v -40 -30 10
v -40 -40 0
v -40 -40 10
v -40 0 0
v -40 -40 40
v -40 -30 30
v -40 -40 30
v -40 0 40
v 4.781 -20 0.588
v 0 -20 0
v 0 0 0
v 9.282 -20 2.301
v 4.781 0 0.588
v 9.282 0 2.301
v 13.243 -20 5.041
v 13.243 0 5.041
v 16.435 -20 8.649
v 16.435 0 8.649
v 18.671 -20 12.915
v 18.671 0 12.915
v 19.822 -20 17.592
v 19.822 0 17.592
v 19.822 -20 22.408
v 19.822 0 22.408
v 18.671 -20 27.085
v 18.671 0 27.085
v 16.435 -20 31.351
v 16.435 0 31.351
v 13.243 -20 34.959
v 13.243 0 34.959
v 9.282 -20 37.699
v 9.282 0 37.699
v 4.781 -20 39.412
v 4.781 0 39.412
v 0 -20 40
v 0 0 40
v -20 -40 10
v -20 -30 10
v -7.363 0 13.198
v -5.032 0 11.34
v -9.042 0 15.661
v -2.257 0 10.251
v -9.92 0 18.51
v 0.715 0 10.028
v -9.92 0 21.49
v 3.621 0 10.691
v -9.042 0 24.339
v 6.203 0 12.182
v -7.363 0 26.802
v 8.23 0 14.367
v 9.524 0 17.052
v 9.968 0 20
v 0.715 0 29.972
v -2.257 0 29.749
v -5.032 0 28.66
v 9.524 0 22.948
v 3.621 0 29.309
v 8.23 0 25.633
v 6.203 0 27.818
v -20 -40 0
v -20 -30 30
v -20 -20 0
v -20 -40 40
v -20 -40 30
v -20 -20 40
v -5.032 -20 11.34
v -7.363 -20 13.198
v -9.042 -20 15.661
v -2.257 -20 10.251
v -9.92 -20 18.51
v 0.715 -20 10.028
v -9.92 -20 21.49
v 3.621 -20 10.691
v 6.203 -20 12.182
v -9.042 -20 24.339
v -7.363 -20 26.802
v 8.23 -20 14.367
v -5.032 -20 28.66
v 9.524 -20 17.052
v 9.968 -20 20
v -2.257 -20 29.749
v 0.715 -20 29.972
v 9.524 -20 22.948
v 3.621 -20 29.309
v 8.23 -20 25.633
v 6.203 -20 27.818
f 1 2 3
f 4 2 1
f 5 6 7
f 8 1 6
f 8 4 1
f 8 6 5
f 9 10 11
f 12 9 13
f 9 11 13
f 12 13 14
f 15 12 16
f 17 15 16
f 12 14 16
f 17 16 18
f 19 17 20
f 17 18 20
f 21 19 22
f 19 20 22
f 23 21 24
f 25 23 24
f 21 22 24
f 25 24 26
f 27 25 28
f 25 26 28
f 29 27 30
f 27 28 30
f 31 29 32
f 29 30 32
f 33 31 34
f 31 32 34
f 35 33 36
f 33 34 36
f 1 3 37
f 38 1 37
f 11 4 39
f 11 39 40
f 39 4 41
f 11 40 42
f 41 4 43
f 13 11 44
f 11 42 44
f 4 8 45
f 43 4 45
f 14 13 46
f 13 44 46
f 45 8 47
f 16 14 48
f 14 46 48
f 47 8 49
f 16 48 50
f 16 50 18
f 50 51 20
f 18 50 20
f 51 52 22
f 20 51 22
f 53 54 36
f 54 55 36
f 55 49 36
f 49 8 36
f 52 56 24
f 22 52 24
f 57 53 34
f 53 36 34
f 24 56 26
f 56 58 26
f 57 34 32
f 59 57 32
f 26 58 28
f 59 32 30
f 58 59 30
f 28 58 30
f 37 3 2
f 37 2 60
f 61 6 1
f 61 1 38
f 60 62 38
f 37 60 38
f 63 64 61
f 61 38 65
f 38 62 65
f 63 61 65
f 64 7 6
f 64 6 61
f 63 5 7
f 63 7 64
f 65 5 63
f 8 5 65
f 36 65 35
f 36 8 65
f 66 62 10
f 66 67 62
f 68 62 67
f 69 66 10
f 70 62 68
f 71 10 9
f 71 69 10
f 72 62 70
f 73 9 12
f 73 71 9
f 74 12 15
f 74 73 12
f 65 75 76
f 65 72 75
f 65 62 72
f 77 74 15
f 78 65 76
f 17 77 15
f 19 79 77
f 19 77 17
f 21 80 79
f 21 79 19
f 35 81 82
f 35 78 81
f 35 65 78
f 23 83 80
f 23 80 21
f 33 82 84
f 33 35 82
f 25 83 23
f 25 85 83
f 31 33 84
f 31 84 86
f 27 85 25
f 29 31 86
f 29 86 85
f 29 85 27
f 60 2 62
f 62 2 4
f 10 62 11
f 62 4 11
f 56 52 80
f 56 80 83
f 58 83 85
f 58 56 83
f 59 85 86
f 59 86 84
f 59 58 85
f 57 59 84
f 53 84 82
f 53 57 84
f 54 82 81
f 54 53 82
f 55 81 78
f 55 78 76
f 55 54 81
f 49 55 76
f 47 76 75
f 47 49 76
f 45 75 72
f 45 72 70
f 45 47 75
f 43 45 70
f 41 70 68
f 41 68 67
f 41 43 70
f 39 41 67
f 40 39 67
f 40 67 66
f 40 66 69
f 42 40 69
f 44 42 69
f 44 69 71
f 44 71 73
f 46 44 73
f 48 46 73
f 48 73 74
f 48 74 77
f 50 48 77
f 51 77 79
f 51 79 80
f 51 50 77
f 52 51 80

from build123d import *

# Parameters (mm, degrees)
F0_R     = 10
F1_DEPTH = 20
F2_W     = 20
F2_H     = 40
F3_DEPTH = 20
F4_W     = 20
F4_H     = 20
F5_DEPTH = 10


with BuildPart() as f1:
    # F0 (on Front) → F1 (new body)
    with BuildSketch(Plane.XZ):
        with BuildLine():
            Line((-40, 40), (-40, 0))
            Line((-40, 0), (0, 0))
            ThreePointArc((0, 0), (19.968011, 20), (0, 40))
            Line((0, 40), (-40, 40))
        make_face()
        with Locations((-0.032014, 20)):
            Circle(F0_R, mode=Mode.SUBTRACT)
    extrude(amount=F1_DEPTH)

    # F2 (on face) → F3 (join)
    with BuildSketch(Plane.XZ.offset(20)):
        with Locations((-30, 20)):
            Rectangle(F2_W, F2_H)
    extrude(amount=F3_DEPTH)

    # F4 (on face) → F5 (cut)
    with BuildSketch(Plane.XZ.offset(40)):
        with Locations((-30, 20)):
            Rectangle(F4_W, F4_H)
    extrude(amount=-F5_DEPTH, mode=Mode.SUBTRACT)


solid = f1.part
